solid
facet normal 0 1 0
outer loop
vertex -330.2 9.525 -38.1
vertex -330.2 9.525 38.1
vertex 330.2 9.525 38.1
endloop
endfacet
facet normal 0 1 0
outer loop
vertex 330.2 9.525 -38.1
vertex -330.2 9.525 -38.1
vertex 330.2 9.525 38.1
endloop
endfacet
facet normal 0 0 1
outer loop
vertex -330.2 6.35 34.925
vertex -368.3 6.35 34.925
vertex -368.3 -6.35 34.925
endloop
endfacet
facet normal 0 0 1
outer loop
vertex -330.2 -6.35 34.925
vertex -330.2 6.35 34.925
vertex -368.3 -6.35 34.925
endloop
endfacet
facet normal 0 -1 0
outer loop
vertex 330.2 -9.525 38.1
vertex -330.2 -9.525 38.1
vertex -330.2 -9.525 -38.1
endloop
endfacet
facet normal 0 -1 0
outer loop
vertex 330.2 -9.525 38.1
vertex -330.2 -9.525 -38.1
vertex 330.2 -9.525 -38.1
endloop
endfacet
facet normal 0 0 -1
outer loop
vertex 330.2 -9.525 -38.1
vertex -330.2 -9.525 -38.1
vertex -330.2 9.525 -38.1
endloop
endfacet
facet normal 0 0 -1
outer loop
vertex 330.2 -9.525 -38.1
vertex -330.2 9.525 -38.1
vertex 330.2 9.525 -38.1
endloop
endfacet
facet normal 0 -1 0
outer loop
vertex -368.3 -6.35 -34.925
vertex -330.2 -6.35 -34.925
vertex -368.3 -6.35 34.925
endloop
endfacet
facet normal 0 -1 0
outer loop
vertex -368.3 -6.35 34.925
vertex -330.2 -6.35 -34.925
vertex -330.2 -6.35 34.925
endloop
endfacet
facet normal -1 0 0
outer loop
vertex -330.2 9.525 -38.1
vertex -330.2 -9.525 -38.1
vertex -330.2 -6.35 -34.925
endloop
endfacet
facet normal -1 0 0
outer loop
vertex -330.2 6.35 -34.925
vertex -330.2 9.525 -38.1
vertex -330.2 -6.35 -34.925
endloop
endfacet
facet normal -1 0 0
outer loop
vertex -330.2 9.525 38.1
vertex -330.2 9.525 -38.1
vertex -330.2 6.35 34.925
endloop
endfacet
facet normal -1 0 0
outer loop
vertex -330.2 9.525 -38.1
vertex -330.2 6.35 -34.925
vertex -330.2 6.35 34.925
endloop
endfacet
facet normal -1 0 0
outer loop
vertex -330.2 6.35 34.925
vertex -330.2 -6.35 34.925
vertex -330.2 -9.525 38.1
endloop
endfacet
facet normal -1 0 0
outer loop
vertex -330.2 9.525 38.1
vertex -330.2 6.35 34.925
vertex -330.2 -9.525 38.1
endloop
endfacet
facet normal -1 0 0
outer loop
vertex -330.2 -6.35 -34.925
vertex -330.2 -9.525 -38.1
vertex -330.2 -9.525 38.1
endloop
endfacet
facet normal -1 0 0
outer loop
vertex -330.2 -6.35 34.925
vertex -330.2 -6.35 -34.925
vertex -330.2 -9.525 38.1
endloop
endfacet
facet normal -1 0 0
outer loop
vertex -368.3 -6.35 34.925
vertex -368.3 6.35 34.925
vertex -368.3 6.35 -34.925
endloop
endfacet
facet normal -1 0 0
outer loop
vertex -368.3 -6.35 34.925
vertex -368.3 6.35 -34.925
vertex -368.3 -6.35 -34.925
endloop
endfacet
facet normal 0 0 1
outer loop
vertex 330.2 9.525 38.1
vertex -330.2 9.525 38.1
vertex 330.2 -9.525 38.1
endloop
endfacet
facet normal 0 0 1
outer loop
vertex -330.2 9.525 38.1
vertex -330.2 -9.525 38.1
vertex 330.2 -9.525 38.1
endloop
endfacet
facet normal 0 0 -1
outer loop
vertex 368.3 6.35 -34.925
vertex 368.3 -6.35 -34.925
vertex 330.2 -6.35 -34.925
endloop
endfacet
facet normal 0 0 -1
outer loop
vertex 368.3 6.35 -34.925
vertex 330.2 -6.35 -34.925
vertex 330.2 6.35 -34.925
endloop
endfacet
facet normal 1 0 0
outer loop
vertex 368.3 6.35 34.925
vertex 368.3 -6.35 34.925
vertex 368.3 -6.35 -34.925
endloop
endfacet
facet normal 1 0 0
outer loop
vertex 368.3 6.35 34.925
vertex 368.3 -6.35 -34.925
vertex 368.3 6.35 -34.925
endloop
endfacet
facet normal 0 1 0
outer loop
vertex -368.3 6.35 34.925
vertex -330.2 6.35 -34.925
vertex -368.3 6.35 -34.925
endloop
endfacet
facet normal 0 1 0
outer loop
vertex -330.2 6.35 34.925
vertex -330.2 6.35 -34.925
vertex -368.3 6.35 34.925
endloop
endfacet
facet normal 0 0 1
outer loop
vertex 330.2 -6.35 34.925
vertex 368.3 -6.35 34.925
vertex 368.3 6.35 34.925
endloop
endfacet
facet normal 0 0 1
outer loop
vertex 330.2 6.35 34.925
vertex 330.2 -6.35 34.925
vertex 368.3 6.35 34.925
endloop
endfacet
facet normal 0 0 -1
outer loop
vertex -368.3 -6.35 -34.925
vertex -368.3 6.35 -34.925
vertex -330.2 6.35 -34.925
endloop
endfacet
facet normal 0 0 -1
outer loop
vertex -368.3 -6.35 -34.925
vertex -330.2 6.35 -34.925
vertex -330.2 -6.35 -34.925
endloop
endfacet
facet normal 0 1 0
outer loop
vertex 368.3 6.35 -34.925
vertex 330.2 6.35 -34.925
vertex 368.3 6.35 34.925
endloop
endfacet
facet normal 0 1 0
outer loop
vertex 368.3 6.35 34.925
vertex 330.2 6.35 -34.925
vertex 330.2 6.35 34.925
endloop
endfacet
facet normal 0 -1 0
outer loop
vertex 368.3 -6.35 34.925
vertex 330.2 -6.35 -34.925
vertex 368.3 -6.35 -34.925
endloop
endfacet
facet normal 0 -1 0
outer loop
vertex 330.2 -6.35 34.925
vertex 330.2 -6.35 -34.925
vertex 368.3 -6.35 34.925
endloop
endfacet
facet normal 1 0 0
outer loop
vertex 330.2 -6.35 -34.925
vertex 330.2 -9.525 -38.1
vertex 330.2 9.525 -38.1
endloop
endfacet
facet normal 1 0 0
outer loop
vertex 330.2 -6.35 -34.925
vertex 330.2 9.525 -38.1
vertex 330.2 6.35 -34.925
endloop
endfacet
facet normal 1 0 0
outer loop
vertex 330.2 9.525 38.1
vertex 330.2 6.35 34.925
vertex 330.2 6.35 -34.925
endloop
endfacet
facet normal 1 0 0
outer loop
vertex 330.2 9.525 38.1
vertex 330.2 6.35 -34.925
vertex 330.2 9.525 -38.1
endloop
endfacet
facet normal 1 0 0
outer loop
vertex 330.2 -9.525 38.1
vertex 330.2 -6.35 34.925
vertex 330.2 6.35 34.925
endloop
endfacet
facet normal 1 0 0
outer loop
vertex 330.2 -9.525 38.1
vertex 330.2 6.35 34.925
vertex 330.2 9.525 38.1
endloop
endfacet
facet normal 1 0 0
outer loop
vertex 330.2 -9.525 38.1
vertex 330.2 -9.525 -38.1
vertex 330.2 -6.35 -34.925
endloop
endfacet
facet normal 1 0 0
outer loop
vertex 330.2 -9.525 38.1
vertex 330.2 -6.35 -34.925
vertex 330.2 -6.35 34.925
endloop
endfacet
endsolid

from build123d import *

# Parameters (mm, degrees)
F0_W     = 660.4
F0_H     = 76.2
F1_DEPTH = 9.525
F2_W     = 12.7
F2_H     = 69.85
F3_W     = 12.7
F3_H     = 69.85
F4_DEPTH = 38.1
F5_DEPTH = 38.1


with BuildPart() as f1:
    # F0 (on Front) → F1 (new body, symmetric)
    with BuildSketch(Plane.XZ):
        Rectangle(F0_W, F0_H)
    extrude(amount=F1_DEPTH, both=True)

    # F2 (on face) + F3 (on face) → F4 (join)
    with BuildSketch(Plane.YZ.offset(330.2)):
        Rectangle(F2_W, F2_H)
    with BuildSketch(Plane(origin=(-330.2, 0, 0), x_dir=(0, -1, 0), z_dir=(-1, 0, 0))):
        Rectangle(F3_W, F3_H)
    extrude(amount=F4_DEPTH)

    # F3 (on face) → F5 (join)
    with BuildSketch(Plane(origin=(-330.2, 0, 0), x_dir=(0, -1, 0), z_dir=(-1, 0, 0))):
        Rectangle(F3_W, F3_H)
    extrude(amount=F5_DEPTH)


solid = f1.part
